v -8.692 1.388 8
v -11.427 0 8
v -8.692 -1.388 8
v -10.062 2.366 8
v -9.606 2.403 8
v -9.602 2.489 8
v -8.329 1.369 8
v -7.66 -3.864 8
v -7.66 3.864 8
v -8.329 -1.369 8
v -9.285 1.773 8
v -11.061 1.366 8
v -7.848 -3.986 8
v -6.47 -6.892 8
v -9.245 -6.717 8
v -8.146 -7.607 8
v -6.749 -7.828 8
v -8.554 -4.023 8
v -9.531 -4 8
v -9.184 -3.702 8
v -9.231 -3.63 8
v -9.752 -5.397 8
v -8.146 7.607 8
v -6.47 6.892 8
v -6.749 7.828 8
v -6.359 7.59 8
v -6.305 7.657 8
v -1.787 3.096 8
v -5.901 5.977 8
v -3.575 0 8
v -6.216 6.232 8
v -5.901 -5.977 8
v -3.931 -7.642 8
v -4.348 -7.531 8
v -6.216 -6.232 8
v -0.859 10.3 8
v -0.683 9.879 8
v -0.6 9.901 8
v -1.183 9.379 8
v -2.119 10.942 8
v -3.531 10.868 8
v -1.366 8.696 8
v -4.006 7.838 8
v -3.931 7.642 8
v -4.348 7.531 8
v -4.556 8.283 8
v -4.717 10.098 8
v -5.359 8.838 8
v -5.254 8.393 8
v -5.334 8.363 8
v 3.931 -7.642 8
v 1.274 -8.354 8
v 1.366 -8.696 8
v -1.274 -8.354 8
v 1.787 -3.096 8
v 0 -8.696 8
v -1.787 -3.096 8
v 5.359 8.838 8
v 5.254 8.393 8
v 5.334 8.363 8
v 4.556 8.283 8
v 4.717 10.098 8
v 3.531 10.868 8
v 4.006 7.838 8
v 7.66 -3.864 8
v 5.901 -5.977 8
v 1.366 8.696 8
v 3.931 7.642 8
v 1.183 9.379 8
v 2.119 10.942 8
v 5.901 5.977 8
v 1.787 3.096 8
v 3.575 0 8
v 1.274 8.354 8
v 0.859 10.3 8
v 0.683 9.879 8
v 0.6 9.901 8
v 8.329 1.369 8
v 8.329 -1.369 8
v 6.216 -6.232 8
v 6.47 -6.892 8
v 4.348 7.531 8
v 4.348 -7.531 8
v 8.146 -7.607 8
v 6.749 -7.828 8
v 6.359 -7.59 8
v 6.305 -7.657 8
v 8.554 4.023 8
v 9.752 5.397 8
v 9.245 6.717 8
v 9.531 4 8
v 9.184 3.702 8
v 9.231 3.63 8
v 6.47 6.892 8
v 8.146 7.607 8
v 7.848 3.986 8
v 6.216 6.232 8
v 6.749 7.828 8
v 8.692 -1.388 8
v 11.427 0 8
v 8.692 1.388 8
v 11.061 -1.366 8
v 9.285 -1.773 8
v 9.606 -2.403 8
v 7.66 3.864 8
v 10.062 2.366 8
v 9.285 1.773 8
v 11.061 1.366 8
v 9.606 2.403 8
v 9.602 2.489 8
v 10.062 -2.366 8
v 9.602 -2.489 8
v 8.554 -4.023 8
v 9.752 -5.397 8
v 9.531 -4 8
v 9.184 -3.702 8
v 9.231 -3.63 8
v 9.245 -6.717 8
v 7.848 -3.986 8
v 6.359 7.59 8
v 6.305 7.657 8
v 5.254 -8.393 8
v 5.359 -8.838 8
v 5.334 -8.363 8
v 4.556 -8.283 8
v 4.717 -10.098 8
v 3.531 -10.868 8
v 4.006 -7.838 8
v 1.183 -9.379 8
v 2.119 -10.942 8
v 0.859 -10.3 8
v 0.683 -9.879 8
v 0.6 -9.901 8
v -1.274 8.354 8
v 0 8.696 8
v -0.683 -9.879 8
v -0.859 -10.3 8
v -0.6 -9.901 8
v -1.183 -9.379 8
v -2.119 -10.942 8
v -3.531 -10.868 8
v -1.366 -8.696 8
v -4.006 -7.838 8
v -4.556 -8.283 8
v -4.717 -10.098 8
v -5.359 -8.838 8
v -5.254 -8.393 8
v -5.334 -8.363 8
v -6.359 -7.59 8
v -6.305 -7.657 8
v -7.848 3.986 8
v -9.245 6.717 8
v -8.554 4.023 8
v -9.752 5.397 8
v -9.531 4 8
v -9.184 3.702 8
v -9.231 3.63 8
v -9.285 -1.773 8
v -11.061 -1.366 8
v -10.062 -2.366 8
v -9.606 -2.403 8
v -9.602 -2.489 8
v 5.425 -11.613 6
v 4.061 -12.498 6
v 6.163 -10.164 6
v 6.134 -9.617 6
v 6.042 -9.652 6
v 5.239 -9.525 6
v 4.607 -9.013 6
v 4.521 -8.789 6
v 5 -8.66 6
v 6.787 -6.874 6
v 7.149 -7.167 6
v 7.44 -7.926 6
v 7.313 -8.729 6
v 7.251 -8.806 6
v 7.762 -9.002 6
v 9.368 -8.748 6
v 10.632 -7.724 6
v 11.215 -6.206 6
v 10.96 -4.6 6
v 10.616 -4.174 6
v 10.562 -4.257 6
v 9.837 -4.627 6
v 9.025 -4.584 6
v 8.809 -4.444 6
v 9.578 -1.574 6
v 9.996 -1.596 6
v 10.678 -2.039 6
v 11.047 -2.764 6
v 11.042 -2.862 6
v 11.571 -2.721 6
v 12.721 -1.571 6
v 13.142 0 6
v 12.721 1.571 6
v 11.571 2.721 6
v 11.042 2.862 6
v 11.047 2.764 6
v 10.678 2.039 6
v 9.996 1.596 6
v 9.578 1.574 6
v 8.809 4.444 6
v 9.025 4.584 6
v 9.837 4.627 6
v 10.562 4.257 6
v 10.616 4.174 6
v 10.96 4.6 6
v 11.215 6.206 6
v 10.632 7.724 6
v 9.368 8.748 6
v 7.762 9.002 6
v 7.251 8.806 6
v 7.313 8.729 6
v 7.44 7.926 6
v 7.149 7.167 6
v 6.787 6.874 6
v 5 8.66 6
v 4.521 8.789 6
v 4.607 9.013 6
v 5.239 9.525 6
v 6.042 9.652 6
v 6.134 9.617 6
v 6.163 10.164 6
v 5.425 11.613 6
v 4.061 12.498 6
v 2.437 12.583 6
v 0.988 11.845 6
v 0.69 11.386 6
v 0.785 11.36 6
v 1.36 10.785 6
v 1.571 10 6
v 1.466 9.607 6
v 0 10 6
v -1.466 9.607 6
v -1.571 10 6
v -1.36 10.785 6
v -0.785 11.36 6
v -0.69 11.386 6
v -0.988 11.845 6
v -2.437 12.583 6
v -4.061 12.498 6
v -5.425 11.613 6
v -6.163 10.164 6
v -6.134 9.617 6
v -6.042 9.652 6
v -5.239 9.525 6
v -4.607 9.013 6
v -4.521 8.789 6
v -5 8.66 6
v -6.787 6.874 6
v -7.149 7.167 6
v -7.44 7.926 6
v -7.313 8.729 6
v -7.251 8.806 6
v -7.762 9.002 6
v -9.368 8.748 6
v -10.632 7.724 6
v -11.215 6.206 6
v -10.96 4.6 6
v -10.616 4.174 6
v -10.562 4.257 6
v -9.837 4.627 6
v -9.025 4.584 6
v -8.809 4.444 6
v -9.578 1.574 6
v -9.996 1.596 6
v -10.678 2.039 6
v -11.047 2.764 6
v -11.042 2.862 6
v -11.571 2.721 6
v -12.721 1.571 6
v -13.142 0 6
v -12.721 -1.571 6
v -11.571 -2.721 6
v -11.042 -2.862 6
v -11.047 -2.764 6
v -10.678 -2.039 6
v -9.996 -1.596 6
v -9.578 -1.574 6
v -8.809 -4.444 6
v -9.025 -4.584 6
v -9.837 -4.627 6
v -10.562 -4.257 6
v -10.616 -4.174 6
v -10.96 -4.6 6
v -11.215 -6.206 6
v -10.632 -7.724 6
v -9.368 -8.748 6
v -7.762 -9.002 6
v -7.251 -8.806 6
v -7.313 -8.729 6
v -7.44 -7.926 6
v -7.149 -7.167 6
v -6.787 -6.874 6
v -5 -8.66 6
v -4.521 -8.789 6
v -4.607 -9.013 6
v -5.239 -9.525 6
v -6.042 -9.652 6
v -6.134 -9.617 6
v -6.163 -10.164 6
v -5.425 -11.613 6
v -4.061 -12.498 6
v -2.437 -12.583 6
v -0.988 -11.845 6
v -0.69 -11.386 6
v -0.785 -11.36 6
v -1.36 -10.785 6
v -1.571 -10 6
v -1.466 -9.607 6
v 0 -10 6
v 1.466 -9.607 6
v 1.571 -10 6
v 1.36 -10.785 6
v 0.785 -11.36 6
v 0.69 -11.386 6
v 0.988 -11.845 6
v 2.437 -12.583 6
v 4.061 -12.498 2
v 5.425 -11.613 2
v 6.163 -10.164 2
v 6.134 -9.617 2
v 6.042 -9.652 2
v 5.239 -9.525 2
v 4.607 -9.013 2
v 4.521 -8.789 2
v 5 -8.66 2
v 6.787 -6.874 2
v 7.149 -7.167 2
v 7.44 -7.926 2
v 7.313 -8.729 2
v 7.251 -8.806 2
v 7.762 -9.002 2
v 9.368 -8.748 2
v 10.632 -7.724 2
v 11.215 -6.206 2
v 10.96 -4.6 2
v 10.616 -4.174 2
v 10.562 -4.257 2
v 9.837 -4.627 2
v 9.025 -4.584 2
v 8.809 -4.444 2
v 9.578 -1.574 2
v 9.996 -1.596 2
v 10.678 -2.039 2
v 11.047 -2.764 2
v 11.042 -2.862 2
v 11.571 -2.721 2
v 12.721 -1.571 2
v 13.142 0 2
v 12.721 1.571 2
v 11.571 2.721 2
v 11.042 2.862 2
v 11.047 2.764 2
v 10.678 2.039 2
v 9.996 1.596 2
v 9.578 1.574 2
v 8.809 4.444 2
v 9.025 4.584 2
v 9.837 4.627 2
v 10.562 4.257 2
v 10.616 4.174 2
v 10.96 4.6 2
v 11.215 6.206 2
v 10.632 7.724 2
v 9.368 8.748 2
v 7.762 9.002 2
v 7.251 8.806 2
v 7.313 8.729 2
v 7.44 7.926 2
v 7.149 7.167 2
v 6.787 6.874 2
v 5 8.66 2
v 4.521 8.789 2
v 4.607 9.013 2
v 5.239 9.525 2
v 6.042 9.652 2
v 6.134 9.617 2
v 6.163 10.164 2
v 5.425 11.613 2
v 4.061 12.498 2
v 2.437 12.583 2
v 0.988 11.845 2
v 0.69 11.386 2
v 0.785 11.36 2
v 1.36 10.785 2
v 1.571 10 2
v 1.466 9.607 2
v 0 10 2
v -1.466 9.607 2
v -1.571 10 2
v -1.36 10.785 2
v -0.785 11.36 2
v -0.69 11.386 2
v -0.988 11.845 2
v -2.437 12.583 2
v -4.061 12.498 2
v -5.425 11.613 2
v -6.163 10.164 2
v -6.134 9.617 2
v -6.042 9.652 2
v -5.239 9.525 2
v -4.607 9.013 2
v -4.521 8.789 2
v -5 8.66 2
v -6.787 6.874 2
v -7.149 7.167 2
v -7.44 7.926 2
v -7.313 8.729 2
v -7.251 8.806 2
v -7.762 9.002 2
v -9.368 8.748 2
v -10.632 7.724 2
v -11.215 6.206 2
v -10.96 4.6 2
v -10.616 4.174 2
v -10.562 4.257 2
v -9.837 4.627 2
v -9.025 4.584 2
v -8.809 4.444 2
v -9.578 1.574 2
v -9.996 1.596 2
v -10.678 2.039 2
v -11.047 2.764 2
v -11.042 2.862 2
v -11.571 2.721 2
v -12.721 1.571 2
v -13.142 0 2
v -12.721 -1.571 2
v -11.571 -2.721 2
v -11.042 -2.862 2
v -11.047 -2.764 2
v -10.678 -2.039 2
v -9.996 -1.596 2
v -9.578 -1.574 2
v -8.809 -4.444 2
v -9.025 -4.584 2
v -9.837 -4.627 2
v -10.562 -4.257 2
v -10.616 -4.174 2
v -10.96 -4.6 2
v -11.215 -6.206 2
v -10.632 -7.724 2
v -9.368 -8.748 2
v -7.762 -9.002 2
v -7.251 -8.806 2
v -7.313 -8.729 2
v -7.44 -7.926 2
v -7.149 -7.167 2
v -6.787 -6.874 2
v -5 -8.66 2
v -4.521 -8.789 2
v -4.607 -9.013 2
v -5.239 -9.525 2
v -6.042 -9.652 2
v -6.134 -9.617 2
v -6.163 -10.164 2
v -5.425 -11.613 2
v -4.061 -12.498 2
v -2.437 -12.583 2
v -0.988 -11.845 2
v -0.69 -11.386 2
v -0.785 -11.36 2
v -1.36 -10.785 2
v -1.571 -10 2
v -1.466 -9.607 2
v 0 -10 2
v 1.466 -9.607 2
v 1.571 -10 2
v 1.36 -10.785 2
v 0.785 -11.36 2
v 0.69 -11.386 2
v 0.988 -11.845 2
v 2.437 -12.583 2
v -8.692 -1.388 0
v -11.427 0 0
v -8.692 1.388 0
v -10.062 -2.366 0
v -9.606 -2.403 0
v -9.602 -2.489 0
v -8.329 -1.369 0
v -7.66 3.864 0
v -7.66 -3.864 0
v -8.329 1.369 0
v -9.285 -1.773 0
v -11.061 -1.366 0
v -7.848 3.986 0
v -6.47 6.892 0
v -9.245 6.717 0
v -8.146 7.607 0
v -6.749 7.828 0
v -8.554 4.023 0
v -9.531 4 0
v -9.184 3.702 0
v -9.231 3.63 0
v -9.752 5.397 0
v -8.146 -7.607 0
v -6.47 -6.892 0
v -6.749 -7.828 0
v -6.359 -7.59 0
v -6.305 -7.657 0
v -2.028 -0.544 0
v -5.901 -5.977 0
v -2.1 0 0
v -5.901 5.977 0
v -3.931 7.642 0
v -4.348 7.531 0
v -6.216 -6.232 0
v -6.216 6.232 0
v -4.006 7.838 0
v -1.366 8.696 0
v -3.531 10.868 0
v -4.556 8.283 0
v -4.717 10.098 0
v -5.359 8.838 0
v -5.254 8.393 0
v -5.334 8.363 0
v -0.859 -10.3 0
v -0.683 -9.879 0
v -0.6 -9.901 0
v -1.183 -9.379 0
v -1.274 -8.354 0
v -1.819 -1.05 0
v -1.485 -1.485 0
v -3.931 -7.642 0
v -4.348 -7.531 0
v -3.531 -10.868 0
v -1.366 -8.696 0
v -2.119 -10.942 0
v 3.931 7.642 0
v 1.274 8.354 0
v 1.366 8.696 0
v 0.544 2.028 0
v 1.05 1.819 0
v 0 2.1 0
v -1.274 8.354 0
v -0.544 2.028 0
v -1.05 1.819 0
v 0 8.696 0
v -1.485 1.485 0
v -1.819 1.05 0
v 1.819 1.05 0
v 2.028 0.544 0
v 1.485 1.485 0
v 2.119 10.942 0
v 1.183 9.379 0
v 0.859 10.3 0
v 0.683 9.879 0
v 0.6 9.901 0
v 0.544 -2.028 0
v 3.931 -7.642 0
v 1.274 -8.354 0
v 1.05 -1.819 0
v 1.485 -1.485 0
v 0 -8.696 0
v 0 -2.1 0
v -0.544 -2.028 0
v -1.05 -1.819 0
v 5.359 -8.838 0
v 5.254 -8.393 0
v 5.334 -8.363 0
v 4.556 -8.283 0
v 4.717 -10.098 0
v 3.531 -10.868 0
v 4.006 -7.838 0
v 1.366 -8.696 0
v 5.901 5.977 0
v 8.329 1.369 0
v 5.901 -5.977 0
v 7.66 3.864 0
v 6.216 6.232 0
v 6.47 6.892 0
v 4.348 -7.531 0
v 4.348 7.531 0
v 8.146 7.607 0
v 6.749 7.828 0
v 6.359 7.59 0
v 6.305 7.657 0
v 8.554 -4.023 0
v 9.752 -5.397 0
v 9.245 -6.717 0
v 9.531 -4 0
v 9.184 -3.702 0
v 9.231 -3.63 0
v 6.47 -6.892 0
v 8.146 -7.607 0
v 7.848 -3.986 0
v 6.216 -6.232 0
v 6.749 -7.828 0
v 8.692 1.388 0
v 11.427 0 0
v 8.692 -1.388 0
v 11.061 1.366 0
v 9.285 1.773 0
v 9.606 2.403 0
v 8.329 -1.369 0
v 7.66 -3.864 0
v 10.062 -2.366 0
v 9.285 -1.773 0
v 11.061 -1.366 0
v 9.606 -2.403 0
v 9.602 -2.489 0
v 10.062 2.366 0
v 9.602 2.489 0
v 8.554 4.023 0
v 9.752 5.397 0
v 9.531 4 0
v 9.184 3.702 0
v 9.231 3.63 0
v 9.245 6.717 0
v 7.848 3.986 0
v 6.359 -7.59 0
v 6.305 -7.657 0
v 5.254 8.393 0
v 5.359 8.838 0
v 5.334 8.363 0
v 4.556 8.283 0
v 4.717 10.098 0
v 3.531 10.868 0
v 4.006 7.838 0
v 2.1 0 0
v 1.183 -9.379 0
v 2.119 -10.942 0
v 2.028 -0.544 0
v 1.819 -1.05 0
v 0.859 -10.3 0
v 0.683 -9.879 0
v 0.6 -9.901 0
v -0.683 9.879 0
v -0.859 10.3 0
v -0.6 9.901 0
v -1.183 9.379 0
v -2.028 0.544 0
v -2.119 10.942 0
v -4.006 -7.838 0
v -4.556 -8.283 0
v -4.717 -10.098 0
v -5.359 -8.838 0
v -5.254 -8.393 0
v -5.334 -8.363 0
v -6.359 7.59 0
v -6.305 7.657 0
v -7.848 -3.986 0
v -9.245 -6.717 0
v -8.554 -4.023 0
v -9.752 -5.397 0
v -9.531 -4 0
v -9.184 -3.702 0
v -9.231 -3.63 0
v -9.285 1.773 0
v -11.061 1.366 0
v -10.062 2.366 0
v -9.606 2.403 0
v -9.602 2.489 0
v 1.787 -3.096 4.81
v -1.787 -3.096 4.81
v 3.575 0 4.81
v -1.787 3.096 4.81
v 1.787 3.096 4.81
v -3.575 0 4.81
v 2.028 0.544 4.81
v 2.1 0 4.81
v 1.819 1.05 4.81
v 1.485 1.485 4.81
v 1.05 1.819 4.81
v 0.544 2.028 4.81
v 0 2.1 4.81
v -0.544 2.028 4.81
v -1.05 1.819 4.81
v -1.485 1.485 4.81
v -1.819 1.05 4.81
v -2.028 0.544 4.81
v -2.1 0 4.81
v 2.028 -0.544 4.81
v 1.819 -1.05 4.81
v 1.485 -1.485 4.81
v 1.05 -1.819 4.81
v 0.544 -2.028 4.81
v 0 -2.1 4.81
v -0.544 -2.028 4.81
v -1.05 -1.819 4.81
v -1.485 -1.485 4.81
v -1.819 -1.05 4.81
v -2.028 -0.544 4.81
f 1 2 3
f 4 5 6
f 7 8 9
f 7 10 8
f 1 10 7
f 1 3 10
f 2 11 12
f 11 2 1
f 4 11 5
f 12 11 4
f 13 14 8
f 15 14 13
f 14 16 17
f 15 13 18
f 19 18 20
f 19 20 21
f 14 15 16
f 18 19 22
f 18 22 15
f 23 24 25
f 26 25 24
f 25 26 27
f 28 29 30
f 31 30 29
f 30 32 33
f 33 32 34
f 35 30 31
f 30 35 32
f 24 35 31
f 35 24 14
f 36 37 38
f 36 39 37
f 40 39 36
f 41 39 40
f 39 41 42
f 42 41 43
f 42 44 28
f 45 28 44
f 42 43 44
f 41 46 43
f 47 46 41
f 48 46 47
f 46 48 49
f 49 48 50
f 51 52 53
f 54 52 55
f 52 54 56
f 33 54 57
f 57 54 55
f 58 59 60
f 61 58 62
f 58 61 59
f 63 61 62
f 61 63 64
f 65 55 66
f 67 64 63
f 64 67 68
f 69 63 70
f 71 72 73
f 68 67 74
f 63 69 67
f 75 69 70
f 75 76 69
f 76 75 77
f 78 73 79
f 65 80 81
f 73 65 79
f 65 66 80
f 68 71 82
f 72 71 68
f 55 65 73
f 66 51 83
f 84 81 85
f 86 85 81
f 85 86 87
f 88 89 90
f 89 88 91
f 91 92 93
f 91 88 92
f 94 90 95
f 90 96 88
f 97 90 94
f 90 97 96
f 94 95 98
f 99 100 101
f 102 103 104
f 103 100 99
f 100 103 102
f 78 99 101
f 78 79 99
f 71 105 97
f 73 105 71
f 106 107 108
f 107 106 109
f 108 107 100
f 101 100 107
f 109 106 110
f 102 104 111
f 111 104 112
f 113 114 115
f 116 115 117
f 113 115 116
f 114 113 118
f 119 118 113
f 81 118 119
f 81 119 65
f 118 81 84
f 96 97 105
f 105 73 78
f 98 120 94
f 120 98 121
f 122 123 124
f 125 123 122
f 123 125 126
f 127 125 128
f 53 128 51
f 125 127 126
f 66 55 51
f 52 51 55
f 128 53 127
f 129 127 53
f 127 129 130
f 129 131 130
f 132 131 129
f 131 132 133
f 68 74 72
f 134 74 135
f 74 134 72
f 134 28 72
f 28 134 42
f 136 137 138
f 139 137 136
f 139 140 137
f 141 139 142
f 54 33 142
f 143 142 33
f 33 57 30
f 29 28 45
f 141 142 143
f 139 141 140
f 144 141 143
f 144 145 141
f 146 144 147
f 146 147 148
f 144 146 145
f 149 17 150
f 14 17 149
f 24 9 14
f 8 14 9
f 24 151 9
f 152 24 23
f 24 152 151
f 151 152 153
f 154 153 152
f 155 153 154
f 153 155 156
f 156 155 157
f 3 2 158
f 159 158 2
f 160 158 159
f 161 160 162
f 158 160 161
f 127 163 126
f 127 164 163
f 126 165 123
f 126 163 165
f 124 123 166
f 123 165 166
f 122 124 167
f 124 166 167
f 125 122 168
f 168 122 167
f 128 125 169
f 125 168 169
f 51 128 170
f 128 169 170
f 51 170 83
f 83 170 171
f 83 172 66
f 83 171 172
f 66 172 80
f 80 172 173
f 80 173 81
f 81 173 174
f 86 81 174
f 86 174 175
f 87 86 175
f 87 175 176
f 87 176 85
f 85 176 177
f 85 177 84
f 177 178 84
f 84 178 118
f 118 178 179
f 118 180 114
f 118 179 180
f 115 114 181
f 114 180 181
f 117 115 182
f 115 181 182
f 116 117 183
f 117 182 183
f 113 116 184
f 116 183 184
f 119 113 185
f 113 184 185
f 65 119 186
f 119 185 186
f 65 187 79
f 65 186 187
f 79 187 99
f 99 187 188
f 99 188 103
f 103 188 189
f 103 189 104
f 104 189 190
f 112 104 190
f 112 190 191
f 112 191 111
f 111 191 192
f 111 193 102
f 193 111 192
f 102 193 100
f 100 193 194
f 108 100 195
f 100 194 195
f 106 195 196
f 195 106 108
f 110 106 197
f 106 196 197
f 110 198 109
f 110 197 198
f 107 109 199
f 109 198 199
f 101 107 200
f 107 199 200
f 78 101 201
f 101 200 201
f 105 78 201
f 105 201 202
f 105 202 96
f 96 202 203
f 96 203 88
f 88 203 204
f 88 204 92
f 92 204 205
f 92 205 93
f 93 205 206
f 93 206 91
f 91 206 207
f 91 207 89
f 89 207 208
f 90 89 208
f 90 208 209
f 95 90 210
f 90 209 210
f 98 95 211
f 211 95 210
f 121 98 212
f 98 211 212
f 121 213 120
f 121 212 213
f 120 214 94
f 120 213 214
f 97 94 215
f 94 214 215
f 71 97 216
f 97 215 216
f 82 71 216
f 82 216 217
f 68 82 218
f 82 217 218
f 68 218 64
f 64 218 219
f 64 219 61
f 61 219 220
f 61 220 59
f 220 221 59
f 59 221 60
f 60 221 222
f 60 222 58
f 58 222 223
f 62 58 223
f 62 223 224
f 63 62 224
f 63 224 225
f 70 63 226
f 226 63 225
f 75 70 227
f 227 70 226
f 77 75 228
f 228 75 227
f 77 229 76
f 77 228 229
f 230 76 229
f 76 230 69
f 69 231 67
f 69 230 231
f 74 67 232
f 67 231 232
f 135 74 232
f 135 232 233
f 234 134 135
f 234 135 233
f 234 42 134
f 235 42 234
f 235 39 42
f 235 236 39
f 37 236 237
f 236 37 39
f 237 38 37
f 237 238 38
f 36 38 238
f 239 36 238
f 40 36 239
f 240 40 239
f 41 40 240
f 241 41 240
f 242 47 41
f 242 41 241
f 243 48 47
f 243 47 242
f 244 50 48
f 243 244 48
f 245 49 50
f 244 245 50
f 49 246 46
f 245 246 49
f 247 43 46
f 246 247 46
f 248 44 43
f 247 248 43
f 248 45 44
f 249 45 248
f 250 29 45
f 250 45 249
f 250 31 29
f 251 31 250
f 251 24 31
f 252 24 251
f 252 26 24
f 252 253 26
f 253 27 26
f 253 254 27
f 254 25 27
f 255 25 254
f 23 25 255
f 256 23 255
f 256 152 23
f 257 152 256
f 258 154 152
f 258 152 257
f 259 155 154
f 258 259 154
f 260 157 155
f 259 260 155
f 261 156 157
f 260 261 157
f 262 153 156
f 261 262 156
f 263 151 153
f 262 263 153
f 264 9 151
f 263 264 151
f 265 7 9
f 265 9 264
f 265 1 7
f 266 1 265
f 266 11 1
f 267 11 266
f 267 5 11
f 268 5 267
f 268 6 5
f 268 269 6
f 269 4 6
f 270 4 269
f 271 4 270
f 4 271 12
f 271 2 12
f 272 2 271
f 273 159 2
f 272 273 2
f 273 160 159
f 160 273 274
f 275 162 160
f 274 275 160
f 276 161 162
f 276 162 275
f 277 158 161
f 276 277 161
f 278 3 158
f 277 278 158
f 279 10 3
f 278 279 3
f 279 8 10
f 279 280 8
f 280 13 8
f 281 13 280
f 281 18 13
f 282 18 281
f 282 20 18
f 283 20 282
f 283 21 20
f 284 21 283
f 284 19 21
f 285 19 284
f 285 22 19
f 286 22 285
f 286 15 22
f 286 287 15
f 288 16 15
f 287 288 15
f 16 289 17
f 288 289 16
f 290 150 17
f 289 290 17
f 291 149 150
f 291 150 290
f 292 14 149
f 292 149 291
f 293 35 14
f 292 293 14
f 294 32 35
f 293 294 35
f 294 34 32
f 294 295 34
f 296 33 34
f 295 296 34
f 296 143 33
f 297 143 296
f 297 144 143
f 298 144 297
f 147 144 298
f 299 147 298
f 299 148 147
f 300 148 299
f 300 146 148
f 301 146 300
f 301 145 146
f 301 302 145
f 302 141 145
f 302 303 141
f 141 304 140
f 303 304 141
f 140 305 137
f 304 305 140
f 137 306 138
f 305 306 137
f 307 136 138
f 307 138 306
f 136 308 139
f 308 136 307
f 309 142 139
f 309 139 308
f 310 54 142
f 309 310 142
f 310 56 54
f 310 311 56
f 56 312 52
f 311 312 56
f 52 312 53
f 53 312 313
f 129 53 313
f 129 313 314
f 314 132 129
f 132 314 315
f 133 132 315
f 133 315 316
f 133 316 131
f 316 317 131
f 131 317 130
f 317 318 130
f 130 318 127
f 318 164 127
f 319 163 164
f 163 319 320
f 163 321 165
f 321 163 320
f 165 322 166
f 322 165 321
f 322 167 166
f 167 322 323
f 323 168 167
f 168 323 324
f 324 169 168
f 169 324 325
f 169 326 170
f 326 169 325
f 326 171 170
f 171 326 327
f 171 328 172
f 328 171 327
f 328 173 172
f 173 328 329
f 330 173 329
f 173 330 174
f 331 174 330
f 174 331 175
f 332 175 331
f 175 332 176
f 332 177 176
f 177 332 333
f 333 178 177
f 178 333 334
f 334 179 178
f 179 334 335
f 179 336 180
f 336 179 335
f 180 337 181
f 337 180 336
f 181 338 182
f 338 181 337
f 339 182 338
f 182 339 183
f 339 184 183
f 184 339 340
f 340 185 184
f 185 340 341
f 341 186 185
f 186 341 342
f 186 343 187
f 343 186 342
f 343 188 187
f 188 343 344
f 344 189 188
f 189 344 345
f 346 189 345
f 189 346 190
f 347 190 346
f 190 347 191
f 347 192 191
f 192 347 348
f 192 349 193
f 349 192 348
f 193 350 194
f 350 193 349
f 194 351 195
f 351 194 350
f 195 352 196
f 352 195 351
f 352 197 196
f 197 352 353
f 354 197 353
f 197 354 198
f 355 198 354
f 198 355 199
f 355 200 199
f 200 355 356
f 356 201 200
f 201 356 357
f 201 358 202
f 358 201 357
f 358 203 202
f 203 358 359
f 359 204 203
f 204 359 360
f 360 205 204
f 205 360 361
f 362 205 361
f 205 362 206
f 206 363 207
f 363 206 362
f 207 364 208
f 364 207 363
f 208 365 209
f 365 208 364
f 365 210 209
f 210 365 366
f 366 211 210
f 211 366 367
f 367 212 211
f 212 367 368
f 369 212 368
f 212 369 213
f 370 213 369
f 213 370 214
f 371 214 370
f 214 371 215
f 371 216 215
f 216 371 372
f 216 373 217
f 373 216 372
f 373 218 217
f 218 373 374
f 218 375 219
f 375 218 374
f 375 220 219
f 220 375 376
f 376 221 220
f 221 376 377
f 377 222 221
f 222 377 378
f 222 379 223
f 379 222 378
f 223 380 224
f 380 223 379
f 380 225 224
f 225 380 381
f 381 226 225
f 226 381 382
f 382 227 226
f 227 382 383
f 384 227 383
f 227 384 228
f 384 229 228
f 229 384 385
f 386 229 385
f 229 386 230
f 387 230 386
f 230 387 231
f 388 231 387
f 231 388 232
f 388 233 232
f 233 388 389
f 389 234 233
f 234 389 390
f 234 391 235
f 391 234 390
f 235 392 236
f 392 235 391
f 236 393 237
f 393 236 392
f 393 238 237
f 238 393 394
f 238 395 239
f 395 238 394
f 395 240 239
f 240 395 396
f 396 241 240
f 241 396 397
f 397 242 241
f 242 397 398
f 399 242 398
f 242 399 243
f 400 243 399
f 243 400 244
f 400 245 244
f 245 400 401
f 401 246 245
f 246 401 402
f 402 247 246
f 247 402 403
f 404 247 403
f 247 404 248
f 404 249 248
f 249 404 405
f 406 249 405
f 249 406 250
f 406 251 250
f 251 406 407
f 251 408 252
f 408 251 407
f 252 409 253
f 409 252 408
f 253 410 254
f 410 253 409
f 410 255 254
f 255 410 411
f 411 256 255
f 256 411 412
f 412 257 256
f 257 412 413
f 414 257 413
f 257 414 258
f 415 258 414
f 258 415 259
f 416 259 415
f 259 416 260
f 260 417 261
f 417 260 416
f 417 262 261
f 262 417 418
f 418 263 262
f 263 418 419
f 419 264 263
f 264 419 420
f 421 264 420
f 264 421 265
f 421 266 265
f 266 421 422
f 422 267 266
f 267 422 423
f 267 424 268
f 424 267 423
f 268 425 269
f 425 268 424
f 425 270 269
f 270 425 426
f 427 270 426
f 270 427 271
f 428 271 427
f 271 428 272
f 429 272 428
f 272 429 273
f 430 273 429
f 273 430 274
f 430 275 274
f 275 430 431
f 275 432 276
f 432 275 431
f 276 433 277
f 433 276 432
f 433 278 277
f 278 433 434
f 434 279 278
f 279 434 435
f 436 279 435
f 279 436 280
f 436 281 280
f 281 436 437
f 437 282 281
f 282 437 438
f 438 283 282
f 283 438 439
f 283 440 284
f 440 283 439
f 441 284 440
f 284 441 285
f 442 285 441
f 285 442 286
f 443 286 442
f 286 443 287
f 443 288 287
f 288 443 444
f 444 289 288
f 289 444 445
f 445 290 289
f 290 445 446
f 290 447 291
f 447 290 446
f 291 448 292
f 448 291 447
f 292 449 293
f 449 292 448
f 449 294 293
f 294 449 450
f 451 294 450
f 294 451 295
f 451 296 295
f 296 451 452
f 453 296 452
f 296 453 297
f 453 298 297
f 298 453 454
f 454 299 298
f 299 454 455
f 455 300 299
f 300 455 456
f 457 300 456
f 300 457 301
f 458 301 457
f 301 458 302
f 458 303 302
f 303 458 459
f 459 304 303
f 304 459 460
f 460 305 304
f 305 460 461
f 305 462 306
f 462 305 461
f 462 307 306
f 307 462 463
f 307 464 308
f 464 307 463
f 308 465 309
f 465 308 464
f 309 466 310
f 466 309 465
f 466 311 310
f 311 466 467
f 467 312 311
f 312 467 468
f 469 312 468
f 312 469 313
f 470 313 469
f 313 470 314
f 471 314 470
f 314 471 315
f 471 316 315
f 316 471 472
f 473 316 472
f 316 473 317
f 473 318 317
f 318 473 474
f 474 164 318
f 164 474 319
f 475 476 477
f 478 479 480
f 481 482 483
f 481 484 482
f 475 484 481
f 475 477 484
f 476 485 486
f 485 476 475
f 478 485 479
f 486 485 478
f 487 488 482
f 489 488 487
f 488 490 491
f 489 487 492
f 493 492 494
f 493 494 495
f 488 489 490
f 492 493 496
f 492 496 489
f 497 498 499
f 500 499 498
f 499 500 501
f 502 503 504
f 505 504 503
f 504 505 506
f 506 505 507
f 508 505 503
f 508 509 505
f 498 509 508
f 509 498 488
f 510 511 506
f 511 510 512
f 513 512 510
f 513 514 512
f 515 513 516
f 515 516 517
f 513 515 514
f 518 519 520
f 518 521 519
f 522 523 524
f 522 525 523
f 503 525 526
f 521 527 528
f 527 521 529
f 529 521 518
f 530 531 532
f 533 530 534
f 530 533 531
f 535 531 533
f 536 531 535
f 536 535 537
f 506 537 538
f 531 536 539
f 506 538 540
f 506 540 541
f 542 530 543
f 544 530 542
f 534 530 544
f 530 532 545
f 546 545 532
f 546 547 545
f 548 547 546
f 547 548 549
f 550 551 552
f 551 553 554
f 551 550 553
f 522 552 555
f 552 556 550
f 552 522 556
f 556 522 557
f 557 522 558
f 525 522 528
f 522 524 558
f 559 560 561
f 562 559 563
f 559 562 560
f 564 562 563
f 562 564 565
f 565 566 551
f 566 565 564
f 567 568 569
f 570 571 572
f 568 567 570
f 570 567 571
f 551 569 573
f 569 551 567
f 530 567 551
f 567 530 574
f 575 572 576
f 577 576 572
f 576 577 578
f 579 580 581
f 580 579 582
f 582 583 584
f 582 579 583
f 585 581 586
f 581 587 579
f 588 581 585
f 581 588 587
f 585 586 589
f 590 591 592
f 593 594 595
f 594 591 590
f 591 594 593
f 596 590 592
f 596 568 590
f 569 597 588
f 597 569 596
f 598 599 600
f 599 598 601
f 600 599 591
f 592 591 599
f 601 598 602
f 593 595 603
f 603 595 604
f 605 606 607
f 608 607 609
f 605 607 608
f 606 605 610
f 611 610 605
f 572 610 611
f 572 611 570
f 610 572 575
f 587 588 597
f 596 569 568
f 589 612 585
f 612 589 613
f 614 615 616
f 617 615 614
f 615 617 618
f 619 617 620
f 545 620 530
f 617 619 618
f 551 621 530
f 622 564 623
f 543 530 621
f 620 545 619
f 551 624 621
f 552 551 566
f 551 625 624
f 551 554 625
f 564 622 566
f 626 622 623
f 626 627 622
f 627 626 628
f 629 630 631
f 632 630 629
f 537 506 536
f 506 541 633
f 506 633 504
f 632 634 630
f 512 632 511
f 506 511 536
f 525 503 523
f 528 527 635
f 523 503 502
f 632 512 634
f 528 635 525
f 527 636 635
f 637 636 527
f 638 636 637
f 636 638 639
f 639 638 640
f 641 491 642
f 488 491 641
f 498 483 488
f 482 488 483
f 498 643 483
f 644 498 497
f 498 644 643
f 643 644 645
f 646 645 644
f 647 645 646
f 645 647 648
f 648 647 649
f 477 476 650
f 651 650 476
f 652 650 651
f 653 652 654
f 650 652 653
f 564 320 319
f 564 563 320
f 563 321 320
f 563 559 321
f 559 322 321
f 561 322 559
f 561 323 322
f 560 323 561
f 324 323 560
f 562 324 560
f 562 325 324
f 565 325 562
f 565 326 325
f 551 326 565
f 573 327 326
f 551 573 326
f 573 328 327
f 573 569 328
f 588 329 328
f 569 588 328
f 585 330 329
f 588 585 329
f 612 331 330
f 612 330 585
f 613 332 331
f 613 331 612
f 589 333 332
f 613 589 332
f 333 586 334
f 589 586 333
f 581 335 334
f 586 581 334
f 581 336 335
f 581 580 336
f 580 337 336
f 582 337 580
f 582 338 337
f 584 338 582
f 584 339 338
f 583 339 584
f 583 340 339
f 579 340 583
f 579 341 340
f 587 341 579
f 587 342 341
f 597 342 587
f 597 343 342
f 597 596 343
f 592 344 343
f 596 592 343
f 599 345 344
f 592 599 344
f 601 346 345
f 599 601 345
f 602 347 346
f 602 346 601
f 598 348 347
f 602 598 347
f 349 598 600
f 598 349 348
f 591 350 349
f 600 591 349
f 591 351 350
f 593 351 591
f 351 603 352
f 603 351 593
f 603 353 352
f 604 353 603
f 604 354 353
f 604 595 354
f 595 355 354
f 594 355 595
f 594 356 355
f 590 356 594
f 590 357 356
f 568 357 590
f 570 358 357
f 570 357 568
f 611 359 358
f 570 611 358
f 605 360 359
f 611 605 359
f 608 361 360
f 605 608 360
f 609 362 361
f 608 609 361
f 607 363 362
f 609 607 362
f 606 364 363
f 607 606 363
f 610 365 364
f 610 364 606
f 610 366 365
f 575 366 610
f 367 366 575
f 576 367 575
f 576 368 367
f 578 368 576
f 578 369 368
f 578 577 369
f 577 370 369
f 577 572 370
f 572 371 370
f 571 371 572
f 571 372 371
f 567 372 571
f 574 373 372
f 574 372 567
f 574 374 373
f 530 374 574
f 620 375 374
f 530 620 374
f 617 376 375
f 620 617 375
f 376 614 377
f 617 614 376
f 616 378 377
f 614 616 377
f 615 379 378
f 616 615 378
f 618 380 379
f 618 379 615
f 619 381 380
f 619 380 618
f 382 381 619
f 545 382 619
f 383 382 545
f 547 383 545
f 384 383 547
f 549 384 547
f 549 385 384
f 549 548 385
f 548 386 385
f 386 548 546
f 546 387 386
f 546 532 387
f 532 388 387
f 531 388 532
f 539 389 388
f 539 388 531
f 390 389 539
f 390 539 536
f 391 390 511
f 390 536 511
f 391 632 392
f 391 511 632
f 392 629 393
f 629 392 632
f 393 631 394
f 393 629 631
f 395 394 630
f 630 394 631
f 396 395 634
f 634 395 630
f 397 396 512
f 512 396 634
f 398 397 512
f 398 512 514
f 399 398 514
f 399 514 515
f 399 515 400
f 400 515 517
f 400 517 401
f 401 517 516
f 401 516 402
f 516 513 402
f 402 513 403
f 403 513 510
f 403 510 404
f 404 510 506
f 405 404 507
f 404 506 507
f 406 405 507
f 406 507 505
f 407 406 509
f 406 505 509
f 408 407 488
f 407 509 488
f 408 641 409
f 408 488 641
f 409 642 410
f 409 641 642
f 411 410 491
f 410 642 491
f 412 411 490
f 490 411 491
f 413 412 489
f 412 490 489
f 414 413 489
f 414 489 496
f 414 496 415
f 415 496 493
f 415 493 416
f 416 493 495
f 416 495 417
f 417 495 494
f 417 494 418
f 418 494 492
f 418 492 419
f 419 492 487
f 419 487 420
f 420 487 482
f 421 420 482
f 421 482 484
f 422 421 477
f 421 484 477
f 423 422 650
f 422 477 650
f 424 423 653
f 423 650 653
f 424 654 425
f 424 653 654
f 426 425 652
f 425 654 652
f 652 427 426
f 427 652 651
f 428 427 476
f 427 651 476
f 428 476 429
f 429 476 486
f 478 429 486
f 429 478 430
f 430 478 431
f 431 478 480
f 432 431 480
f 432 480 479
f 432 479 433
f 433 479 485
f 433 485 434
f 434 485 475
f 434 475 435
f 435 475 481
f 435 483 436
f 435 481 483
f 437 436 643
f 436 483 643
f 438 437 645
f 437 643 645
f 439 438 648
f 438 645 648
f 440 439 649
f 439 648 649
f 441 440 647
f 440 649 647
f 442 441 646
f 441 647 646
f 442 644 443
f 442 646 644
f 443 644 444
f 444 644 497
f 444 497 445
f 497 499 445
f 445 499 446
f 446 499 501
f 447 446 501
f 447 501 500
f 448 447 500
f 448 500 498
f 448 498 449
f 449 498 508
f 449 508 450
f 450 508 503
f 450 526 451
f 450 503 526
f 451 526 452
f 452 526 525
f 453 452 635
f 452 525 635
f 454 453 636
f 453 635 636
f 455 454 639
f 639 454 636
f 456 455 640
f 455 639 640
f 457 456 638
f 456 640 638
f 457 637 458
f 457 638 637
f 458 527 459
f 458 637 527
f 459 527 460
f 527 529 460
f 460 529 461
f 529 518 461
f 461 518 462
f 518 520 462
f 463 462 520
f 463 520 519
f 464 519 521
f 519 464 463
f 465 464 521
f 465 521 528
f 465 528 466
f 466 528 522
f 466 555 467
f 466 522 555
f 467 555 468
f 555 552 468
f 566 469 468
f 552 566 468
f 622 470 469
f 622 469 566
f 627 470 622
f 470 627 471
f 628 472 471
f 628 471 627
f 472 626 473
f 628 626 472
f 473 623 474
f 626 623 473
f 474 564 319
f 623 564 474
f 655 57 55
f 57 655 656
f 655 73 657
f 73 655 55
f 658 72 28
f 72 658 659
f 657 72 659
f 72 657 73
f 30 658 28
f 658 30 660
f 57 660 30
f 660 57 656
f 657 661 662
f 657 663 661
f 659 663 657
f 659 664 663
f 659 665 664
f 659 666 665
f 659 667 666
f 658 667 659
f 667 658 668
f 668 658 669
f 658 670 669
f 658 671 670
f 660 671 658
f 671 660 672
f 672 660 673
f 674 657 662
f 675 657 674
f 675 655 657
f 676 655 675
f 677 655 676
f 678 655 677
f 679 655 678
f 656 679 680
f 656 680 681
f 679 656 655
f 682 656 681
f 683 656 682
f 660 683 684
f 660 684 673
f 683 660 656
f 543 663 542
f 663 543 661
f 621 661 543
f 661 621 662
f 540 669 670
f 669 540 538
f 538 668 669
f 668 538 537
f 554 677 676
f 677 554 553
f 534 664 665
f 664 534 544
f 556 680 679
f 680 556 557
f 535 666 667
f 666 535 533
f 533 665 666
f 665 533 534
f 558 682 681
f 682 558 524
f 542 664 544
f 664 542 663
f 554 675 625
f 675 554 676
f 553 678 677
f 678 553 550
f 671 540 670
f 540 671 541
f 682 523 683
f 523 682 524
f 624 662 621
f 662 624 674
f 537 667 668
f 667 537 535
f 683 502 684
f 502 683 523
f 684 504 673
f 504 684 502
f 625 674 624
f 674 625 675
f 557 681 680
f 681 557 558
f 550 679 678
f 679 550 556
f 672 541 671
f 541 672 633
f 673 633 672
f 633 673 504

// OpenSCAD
dialDiameter = 20;
dialWidth = 8;
nibbleCount = 10;

circumferance = PI * dialDiameter;
nibbleDiameter = circumferance / nibbleCount;

module hexNutM4(tolerance=0.15) {
 e = 7+tolerance;
 m = 3.2;
 cylinder(r=e/2, h=m, $fn=6);
}

module handle() {
  difference() {
    for(i=[1:1:nibbleCount]) {
      degree = 360/nibbleCount;
      rotate([0, 0, degree*i]) translate([dialDiameter/2, 0, 0]) circle(r=nibbleDiameter/2);
    }
    for(i=[1:1:nibbleCount]) {
      degree = 360/nibbleCount;
      rotate(degree/2) rotate([0, 0, degree*i]) translate([dialDiameter/2, 0, 0]) circle(r=nibbleDiameter/4);
    }
  }

}

module shape() {
  circle(r = dialDiameter/2);
  handle();
}

module handleWithBevel() {
  $fn=12;
  bevelFactor = 1.15;
  linear_extrude(height=dialWidth/4, scale=bevelFactor, convexity=20) scale([1/bevelFactor, 1/bevelFactor]) shape();
  translate([0, 0, 1/4*dialWidth]) linear_extrude(height=dialWidth/2, convexity=20) shape();
  translate([0, 0, 3/4*dialWidth]) linear_extrude(height=dialWidth/4, convexity=20, scale=1/bevelFactor) shape();
}

module handleWithCutout() {
  translate([0, 0, dialWidth]) mirror([0, 0, 1]) difference() {
    handleWithBevel();
    translate([0, 0, -0.01]) hexNutM4();
    translate([0, 0, -0.01]) cylinder(r=2.1, h=10, $fn=24);
  }
}

handleWithCutout();
